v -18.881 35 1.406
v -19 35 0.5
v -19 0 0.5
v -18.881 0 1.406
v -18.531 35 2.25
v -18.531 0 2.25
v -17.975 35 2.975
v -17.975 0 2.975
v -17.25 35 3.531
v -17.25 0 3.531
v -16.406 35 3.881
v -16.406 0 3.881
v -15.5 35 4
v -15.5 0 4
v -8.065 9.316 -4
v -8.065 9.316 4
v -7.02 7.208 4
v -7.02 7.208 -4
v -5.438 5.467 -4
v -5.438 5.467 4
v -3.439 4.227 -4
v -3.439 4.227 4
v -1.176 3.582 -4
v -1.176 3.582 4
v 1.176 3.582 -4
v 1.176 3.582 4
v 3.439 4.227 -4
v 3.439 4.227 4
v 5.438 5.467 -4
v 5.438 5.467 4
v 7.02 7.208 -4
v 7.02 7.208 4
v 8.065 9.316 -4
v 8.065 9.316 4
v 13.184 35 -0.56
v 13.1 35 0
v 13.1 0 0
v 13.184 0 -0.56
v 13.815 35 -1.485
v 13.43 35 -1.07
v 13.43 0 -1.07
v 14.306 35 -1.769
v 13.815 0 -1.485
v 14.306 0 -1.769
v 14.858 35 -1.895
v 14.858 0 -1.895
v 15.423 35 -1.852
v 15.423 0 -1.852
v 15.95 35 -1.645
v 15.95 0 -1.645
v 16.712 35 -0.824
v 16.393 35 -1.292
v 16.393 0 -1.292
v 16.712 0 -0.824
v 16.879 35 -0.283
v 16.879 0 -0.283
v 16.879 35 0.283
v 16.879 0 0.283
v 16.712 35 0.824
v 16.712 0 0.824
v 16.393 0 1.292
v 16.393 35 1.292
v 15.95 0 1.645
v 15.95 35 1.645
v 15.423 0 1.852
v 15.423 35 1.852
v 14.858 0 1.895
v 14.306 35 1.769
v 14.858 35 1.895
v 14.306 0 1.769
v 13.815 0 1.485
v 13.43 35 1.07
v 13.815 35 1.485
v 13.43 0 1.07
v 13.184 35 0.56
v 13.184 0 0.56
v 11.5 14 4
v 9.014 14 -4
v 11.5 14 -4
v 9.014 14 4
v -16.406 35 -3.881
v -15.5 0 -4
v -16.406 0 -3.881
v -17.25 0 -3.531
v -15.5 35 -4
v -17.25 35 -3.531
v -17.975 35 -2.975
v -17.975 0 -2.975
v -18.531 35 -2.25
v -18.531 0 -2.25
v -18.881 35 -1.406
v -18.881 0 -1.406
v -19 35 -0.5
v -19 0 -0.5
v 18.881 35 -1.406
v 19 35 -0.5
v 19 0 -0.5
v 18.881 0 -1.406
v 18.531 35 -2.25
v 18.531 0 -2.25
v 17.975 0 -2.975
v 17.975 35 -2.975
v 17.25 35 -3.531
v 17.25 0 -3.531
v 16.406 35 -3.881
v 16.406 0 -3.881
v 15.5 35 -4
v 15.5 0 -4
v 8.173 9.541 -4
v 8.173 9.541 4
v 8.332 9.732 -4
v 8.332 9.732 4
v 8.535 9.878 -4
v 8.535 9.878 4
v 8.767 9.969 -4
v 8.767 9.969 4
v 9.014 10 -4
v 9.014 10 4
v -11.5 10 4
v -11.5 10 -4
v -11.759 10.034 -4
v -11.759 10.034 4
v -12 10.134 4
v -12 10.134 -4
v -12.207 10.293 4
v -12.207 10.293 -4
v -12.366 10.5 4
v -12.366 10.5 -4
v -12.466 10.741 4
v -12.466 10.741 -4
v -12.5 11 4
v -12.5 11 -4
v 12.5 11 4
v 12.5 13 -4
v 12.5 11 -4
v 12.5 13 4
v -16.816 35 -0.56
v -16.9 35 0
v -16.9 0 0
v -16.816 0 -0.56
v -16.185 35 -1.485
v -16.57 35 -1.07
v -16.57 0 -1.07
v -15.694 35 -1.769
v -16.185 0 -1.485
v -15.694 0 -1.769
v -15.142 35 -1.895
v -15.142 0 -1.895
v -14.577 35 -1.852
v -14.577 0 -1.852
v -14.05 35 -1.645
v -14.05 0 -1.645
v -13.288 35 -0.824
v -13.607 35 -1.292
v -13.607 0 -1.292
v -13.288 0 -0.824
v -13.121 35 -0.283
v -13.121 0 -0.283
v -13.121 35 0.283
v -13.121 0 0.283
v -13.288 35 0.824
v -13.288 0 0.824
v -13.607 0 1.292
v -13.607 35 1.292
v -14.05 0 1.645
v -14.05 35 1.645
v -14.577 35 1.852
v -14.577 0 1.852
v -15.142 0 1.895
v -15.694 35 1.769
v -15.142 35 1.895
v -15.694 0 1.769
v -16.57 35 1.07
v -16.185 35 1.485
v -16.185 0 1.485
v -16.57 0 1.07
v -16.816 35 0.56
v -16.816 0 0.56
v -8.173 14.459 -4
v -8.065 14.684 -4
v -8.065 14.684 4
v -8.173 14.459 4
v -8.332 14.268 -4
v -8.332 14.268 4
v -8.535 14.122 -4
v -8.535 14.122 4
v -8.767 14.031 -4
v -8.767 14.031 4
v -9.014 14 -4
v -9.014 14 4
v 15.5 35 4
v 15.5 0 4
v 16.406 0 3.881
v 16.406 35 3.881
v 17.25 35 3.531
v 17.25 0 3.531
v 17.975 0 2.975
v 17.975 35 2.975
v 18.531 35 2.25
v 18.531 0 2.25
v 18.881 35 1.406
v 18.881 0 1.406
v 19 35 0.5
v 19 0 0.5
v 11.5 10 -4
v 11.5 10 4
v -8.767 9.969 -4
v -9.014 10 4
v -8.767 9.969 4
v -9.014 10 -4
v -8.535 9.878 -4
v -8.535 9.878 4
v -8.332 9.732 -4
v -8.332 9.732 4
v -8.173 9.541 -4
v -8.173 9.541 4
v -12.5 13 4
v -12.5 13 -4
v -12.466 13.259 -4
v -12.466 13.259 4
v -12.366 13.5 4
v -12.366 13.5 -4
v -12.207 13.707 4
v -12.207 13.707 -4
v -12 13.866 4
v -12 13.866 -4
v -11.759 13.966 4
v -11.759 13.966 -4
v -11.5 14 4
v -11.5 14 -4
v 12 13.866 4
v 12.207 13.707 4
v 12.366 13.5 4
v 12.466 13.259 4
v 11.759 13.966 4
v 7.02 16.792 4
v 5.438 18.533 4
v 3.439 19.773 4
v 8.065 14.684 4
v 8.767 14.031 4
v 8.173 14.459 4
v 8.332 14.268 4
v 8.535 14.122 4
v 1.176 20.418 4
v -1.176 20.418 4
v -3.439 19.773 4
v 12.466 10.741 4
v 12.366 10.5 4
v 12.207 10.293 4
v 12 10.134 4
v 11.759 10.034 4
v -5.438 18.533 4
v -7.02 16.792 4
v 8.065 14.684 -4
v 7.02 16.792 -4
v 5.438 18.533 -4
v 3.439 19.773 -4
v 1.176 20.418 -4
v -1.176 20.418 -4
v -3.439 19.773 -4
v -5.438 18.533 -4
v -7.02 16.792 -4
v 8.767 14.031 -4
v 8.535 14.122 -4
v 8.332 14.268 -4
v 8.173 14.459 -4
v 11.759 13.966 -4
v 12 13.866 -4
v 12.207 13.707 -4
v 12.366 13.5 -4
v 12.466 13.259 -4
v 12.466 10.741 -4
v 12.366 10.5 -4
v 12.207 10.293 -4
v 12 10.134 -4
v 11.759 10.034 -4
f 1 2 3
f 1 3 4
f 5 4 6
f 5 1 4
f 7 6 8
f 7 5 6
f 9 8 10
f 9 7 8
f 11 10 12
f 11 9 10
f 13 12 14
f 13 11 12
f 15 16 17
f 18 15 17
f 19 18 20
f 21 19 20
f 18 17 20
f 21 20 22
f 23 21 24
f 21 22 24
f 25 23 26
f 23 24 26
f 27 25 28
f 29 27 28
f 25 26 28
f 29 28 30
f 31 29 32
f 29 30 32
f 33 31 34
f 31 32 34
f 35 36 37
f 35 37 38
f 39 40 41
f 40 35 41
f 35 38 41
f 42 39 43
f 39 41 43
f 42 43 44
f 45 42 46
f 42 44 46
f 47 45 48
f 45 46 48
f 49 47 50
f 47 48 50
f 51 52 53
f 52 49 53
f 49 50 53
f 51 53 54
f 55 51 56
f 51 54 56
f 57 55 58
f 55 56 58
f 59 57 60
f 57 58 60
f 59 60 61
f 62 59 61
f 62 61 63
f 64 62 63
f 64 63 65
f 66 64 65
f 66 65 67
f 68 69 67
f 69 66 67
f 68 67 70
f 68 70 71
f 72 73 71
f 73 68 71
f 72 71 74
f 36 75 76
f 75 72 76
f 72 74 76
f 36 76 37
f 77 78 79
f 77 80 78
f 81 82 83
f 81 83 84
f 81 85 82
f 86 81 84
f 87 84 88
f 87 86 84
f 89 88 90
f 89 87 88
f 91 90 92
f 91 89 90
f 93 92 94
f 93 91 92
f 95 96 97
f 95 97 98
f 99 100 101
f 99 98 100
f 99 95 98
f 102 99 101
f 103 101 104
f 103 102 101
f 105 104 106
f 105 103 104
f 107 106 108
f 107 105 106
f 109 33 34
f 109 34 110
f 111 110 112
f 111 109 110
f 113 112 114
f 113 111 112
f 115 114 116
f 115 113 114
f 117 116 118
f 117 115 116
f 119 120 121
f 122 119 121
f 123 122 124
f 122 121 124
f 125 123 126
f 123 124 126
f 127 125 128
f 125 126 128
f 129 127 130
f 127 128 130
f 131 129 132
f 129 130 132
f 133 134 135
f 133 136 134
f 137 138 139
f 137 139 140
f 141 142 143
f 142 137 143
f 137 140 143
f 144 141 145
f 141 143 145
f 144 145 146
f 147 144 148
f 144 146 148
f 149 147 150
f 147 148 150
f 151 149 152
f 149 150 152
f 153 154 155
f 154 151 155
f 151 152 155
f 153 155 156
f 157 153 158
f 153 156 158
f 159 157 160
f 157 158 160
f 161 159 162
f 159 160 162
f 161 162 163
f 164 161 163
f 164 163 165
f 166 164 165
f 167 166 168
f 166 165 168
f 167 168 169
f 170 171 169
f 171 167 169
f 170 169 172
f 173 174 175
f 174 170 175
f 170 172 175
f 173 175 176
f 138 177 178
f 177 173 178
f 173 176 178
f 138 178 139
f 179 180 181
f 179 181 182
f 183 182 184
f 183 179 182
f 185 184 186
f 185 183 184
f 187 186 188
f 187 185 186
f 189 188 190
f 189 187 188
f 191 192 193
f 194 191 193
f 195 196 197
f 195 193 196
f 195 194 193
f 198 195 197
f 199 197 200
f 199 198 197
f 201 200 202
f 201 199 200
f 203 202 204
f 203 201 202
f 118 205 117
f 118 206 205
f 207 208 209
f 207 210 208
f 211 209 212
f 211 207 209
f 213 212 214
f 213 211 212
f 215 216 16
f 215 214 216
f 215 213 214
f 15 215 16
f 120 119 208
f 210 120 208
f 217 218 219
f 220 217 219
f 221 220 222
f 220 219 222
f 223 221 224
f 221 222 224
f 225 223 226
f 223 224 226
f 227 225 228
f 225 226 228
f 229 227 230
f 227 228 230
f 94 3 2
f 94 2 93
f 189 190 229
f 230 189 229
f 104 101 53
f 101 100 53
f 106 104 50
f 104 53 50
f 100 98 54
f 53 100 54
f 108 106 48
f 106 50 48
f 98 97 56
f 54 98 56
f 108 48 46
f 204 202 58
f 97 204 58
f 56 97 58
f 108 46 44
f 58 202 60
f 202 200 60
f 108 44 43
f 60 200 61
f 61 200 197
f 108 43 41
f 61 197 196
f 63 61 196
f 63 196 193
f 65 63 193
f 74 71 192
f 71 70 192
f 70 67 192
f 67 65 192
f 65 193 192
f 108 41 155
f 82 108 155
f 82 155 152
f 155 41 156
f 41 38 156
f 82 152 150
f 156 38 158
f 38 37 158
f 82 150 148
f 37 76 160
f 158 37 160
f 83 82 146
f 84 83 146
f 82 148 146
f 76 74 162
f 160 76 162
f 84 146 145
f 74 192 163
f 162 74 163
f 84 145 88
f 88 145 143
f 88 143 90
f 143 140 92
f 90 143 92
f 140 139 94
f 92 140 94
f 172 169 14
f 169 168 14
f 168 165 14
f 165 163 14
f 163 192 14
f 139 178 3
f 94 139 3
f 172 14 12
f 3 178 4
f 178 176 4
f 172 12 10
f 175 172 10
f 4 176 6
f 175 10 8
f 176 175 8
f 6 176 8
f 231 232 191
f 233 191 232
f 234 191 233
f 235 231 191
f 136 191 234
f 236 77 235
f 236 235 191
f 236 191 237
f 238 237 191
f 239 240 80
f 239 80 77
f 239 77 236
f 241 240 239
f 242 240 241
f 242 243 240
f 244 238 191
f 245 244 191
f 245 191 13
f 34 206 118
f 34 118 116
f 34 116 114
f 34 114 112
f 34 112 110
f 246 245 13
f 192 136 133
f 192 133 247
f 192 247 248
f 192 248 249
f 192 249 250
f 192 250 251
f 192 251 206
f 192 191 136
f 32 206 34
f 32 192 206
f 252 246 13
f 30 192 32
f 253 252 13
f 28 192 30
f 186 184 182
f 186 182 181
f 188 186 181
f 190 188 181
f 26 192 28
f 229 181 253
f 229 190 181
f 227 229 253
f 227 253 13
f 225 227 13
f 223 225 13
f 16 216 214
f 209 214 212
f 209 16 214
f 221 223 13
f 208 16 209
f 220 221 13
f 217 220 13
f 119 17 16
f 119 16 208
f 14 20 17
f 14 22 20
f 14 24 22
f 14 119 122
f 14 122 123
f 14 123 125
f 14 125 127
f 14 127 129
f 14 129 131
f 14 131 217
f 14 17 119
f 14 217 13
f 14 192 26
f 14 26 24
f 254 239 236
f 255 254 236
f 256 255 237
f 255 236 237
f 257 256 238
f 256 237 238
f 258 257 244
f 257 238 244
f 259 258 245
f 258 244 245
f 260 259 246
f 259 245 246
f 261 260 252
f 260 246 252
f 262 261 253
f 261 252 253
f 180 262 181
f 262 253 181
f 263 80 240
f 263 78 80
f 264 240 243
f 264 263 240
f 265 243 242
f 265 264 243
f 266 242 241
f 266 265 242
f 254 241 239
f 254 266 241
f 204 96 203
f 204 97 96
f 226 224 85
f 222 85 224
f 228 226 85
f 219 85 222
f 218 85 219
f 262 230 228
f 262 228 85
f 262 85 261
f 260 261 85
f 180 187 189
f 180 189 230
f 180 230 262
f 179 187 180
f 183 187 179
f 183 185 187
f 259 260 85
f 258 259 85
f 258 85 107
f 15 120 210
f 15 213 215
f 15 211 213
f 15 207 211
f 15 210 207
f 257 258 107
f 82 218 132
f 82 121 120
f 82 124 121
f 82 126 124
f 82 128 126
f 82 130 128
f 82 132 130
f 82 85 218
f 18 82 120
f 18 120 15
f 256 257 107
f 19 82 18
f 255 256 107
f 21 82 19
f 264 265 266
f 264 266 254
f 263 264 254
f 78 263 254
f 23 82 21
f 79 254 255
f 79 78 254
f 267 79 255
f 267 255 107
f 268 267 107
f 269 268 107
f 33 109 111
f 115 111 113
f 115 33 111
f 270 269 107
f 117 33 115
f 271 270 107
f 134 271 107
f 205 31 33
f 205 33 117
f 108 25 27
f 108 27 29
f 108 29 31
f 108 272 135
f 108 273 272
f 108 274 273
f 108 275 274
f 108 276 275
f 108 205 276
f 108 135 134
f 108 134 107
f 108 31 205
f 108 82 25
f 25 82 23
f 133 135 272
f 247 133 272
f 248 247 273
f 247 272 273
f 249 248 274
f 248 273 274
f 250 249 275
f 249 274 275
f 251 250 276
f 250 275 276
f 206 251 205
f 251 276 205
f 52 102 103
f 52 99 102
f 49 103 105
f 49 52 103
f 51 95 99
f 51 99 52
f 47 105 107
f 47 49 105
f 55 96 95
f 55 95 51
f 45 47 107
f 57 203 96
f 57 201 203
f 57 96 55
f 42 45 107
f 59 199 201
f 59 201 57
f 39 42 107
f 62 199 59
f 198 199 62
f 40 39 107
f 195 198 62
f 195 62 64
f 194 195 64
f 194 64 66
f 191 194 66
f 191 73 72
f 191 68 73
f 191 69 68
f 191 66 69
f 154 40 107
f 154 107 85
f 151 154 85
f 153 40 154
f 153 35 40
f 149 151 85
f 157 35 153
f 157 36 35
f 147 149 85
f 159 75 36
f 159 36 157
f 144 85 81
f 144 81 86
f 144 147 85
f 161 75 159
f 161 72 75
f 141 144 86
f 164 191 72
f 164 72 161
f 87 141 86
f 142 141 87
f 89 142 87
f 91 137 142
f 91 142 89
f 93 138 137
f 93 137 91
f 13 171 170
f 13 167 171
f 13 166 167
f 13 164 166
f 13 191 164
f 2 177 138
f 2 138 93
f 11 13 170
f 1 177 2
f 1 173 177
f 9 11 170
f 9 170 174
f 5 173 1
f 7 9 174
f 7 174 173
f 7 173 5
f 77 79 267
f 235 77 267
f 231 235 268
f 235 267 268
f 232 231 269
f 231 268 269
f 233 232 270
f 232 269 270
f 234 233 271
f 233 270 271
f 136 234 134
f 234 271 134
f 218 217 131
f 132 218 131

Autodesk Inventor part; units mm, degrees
ref_plane "YZ Plane" through (0, 0, 0) normal (1, 0, 0) x (0, 1, 0)
ref_plane "XZ Plane" through (0, 0, 0) normal (0, 1, 0) x (-1, 0, 0)
ref_plane "XY Plane" through (0, 0, 0) normal (0, 0, 1) x (1, 0, 0)
sketch "Эскиз1" plane through (0, 0, 0) normal (1, 0, 0) x (0, 1, 0)
  point P0 (0, 0)
sketch "Эскиз2" plane through (0, 0, 0) normal (0, 1, 0) x (-1, 0, 0)
  line L0 (19, -4) -> (-19, -4)
  line L1 (-19, -4) -> (-19, 4)
  line L2 (-19, 4) -> (19, 4)
  line L3 (19, 4) -> (19, -4)
  line L4 (19, -4) -> (-19, 4) construction
  line L5 (-19, -4) -> (19, 4) construction
  line L6 (19, 0) -> (-19, 0) construction
  circle A0 centre (-15, 0) radius 1.9
  line L7 (0, -4) -> (0, 4) construction
  circle A1 centre (15, 0) radius 1.9
  point P0 (0, 0)
  dimension "d1" = 30
  dimension "d2" = 3.8
  dimension "d3" = 38
  dimension "d4" = 8
extrude "Выдавливание1" add sketch "Эскиз2" along normal blind 35
fillet "Сопряжение1" radius 3.5 4 edges at (19, 17.5, 4) (19, 17.5, -4) (-19, 17.5, 4) (-19, 17.5, -4)
sketch "Эскиз3" plane through (-15.5, 0, 4) normal (0, 0, 1) x (1, 0, 0)
  line L0 (28.6, 35) -> (28.6, 0) construction
  line L1 (0, 0) -> (0, 35) construction
  line L2 (0, 0) -> (31, 0) construction
  line L3 (31, 35) -> (31, 0) construction
  line L4 (0, 35) -> (31, 35) construction
  line L5 (32.4, 35) -> (32.4, 0) construction
  line L6 (34.5, 35) -> (31, 35) construction
  line L7 (31, 35) -> (31, 0) construction
  line L8 (31, 0) -> (34.5, 0) construction
  line L9 (34.5, 0) -> (34.5, 35) construction
  line L10 (-1.4, 35) -> (-1.4, 0) construction
  line L11 (0, 35) -> (-3.5, 35) construction
  line L12 (-3.5, 35) -> (-3.5, 0) construction
  line L13 (-3.5, 0) -> (0, 0) construction
  line L14 (0, 0) -> (0, 35) construction
  line L15 (0, 0) -> (0, 35) construction
  line L16 (-1.4, 35) -> (2.4, 35) construction
  line L17 (28.6, 35) -> (32.4, 35) construction
  line L18 (28.6, 0) -> (32.4, 0) construction
  line L19 (-1.4, 35) -> (2.4, 35) construction
  line L20 (-1.4, 0) -> (2.4, 0) construction
  line L21 (-1.4, 35) -> (2.4, 35) construction
  line L22 (-1.4, 0) -> (2.4, 0) construction
  line L23 (2.4, 35) -> (2.4, 0) construction
  line L24 (28.6, 35) -> (2.4, 0) construction
  line L25 (2.4, 35) -> (28.6, 0) construction
  line L26 (15.5, 17.5) -> (15.5, 35) construction
  line L27 (0, 35) -> (31, 35) construction
  circle A0 centre (15.5, 12) radius 8.5
  point P0 (15.5, 0)
  dimension "d8" = 17
  dimension "d9" = 12
extrude "Выдавливание2" cut sketch "Эскиз3" against normal blind 35
sketch "Эскиз4" plane through (-15.5, 0, 4) normal (0, 0, 1) x (1, 0, 0)
  circle A0 centre (15.5, 12) radius 8.5 projected
  line L0 (0, 0) -> (0, 35) construction
  line L1 (0, 0) -> (31, 0) construction
  line L2 (31, 35) -> (31, 0) construction
  line L3 (0, 35) -> (31, 35) construction
  line L4 (23.7614, 14) -> (28, 14)
  line L5 (28, 14) -> (28, 10)
  line L6 (28, 10) -> (23.7614, 10)
  line L7 (24, 10) -> (24, 14) construction
  circle A1 centre (15.5, 12) radius 8.5 construction
  line L8 (7, 12) -> (24, 12) construction
  line L9 (15.5, 12) -> (15.5, 20.5) construction
  line L10 (7.2386, 14) -> (3, 14)
  line L11 (3, 14) -> (3, 10)
  line L12 (3, 10) -> (7.2386, 10)
  point P0 (15.5, 0)
  dimension "d13" = 4
  dimension "d14" = 4
extrude "Выдавливание3" cut sketch "Эскиз4" against normal blind 10 contours A0 L4 L5 L6 | A0 L12 L11 L10
fillet "Сопряжение2" radius 1 8 edges at (-12.5, 14, 0) (-12.5, 10, 0) (-8.2614, 14, 0) (-8.2614, 10, 0) (8.2614, 14, 0) (8.2614, 10, 0) (12.5, 10, 0) (12.5, 14, 0)
properties part number "inner_mount" material "Пластик АБС"
